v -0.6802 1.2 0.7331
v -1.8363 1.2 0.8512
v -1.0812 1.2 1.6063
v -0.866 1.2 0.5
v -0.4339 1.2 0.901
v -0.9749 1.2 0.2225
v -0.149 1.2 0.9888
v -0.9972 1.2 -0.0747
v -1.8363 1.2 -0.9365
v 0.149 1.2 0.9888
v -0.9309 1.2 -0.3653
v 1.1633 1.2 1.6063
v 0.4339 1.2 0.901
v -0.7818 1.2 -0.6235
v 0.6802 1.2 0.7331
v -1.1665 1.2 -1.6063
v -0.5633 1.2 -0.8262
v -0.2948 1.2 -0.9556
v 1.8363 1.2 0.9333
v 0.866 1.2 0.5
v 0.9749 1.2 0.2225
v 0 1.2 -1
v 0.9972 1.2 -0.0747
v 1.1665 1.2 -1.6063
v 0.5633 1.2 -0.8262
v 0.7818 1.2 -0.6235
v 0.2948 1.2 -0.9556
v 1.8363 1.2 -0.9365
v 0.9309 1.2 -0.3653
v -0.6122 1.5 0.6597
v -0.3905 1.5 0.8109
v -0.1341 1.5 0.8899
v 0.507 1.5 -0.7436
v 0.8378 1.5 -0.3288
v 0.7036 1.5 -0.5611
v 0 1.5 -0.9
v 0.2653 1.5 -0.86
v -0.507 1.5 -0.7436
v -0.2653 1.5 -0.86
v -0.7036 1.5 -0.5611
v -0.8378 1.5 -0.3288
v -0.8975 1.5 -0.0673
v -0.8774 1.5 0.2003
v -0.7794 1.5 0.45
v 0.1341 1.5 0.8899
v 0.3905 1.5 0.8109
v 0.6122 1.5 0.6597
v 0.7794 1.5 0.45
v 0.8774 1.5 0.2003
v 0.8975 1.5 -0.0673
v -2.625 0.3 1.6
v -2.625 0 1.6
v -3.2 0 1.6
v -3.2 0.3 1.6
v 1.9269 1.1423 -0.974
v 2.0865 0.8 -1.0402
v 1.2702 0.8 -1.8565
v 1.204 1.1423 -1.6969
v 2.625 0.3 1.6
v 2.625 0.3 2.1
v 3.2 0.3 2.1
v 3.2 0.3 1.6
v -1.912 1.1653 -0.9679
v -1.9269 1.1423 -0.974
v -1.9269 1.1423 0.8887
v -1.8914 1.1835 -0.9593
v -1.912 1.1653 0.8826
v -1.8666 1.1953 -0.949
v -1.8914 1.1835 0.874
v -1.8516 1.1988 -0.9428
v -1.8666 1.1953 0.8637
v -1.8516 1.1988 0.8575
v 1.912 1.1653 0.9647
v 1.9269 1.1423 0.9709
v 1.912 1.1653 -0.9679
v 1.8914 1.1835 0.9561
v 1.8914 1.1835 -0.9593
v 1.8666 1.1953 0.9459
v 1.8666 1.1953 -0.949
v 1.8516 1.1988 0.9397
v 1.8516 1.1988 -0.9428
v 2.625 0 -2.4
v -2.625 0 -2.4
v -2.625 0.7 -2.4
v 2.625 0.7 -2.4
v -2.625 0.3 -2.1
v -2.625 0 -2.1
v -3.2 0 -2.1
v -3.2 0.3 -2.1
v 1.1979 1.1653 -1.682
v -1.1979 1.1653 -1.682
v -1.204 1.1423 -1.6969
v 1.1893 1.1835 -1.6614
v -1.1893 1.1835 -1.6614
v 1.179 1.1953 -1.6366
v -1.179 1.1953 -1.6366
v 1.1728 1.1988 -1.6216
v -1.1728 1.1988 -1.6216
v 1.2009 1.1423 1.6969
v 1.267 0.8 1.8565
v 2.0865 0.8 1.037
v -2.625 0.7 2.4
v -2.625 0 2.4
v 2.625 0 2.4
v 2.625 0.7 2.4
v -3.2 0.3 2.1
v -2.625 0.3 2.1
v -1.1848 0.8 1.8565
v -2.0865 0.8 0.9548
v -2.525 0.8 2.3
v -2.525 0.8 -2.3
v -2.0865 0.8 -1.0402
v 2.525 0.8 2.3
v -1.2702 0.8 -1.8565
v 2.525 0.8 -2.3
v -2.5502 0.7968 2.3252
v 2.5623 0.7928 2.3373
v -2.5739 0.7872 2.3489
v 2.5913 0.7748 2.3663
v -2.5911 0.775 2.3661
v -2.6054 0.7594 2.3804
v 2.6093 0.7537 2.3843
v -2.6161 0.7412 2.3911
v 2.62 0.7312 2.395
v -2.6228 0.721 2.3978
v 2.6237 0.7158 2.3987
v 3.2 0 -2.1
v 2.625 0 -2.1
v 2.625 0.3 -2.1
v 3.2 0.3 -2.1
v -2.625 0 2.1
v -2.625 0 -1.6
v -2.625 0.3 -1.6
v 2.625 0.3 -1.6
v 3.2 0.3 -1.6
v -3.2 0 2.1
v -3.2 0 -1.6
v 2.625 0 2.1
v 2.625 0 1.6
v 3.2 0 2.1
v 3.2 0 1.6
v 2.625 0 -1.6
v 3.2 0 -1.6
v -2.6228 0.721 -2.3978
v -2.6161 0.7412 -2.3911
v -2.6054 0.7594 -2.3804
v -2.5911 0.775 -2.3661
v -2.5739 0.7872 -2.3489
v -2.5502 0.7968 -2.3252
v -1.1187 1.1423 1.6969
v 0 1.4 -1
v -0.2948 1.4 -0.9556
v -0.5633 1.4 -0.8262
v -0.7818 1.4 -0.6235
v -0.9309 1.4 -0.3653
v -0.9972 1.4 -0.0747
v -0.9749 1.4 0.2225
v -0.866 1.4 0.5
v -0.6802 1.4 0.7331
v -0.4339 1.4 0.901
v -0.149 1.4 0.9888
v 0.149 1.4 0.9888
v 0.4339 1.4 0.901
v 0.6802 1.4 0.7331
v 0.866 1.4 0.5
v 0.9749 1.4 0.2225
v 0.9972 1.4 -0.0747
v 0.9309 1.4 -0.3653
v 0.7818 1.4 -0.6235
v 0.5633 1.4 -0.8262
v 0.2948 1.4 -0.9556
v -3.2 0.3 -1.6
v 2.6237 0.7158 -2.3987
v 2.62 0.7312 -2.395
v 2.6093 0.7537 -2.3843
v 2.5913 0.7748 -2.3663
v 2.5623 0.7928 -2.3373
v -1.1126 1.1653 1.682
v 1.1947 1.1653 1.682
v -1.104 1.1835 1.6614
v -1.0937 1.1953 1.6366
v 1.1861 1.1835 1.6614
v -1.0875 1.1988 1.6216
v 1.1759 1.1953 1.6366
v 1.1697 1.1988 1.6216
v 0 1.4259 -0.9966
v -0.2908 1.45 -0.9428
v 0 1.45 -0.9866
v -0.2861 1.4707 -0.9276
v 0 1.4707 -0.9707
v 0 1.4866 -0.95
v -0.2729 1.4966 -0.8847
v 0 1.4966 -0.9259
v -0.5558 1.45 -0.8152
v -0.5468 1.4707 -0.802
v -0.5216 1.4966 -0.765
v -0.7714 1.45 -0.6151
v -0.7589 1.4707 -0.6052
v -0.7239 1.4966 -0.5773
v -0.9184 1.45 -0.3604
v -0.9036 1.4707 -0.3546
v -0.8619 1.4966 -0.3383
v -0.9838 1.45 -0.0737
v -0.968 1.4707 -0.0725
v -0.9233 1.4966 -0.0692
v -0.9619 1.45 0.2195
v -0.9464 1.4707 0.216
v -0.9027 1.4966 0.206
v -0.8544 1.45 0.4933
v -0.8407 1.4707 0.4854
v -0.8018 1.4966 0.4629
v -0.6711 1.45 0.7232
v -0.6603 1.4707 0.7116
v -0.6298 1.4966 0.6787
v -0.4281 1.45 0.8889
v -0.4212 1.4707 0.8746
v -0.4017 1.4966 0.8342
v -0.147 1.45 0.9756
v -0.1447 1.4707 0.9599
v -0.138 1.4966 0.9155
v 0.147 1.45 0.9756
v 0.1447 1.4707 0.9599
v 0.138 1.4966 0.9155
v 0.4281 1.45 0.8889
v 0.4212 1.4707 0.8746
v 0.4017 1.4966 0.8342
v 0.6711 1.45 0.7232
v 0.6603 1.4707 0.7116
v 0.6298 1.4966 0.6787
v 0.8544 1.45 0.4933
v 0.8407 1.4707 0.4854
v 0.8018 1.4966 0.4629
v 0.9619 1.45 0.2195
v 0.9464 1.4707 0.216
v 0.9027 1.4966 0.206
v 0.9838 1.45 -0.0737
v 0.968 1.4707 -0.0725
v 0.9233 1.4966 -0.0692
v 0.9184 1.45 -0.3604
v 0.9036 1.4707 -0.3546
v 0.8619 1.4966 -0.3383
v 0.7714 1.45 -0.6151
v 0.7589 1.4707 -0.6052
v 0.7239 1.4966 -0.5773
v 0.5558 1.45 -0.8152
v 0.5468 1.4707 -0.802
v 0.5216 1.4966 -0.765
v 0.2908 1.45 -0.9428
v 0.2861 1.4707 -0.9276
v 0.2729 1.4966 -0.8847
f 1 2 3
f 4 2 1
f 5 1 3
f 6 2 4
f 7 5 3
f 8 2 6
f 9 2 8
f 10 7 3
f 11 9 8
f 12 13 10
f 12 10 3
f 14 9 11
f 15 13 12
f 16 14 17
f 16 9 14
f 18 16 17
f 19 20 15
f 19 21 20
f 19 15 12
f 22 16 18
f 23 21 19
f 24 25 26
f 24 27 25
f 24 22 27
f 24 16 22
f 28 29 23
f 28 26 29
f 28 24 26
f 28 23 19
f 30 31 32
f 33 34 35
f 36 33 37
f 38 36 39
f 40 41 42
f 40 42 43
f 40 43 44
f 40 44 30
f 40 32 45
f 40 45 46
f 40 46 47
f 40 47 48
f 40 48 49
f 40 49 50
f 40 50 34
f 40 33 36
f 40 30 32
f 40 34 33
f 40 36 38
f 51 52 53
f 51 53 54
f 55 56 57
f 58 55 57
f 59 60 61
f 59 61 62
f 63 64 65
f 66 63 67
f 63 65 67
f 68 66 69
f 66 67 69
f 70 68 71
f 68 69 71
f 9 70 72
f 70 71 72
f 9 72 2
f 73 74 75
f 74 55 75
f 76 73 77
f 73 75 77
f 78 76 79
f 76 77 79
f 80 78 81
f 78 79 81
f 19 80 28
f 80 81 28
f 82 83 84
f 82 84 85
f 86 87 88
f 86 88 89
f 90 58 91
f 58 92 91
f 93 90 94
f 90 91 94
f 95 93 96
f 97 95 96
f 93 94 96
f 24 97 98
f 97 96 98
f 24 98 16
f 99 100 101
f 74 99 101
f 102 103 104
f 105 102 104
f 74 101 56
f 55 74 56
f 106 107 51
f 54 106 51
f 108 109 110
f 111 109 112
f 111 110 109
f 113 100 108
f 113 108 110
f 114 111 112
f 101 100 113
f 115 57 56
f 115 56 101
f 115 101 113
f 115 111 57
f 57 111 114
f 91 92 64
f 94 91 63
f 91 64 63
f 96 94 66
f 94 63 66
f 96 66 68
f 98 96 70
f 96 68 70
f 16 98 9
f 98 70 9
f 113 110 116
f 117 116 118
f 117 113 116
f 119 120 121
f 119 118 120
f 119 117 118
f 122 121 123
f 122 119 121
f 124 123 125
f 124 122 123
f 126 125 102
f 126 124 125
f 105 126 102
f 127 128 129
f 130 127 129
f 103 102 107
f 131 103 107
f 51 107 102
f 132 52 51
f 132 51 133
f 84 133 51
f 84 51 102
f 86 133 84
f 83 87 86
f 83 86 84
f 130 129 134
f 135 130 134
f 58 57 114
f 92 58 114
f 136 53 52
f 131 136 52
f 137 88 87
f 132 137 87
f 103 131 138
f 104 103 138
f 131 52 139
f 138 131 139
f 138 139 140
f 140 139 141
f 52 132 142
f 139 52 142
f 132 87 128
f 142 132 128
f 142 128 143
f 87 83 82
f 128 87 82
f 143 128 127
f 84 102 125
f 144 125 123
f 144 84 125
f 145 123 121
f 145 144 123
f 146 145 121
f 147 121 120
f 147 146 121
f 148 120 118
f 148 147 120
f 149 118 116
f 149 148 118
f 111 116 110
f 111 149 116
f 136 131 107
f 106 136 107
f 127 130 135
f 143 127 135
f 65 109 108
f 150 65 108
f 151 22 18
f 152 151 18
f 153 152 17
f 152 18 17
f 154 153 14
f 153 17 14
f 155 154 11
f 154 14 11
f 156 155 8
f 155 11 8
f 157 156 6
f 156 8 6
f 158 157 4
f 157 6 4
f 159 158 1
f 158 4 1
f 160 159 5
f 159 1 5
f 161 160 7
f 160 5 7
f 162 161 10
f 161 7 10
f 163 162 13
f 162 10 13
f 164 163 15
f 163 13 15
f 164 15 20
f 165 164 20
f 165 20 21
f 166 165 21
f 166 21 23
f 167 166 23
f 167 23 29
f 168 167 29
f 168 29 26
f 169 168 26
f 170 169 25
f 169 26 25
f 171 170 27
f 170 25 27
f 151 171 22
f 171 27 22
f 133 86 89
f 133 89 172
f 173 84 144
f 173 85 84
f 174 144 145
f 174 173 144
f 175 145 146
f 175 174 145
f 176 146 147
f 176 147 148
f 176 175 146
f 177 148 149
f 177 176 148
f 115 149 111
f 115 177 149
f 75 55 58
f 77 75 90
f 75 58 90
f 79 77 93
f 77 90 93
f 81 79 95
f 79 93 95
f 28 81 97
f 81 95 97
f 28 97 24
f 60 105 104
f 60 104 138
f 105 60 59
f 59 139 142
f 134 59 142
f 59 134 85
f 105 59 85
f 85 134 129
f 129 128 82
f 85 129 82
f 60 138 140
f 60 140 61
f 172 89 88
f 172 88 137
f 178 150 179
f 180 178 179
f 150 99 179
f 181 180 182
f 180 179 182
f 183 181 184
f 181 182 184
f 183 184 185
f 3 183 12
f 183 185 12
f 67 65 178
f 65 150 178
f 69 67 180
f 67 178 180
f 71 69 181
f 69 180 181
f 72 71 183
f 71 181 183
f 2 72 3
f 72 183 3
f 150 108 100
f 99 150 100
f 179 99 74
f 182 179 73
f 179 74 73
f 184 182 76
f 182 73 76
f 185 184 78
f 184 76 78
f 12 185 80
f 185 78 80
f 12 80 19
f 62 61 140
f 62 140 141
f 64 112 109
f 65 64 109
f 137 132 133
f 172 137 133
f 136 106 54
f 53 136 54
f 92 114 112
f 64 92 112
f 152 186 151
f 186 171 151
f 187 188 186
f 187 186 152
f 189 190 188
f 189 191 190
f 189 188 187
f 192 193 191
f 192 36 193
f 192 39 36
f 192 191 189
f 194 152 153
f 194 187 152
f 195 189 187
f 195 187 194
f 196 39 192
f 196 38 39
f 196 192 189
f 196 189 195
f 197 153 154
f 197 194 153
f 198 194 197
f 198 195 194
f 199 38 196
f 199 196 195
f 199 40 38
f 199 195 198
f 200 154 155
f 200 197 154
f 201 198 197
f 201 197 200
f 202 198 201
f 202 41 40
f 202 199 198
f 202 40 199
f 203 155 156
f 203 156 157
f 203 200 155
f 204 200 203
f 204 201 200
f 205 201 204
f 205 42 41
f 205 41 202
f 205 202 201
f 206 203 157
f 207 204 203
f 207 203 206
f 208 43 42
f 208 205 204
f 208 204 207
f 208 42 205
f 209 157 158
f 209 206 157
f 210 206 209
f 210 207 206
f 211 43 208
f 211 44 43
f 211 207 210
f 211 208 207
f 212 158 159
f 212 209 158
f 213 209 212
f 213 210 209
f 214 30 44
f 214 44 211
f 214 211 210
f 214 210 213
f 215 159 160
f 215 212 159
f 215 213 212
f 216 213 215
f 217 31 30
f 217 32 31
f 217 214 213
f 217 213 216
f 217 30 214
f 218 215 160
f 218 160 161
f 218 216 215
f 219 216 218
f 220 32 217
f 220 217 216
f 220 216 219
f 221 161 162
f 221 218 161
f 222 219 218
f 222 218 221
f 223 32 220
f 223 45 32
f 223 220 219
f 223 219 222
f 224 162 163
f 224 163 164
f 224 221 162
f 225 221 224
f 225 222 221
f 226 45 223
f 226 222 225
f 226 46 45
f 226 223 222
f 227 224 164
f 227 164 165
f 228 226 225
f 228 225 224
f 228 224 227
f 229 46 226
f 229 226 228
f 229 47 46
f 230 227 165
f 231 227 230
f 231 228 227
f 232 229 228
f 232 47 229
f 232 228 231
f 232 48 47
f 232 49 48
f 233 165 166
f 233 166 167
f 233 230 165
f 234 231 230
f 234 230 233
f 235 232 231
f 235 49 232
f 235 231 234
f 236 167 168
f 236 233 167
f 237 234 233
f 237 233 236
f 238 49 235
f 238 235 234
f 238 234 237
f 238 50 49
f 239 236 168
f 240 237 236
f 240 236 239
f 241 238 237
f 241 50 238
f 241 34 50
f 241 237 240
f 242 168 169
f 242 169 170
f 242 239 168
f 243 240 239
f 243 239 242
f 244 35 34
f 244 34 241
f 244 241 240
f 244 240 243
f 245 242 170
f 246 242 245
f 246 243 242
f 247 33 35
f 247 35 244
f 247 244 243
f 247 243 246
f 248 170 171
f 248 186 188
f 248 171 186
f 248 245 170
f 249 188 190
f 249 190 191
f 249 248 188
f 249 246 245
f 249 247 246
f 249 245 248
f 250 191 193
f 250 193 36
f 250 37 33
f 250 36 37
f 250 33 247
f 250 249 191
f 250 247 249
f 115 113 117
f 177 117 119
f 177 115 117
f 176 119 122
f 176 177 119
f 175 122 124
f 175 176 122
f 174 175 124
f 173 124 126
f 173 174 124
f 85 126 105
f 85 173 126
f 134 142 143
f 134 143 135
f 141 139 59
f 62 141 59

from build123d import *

# Parameters (mm, degrees)
SKETCH1_W               = 5.25
SKETCH1_H               = 4.8
BOSS_EXTRUDE1_DEPTH     = 0.8
BOSS_EXTRUDE2_DEPTH     = 0.4
SKETCH3_R               = 1
BOSS_EXTRUDE3_DEPTH     = 0.3
SKETCH4_W               = 0.5
SKETCH4_H               = 0.3
BOSS_EXTRUDE4_DEPTH     = 0.575
MIRROR2_COPY_1_SKETCH_W = 0.5
MIRROR2_COPY_1_SKETCH_H = 0.3
MIRROR2_COPY_1_DEPTH    = 0.575
DRAFT3_ANGLE            = 25
FILLET1_R               = 0.1
FILLET2_R               = 0.1


with BuildPart() as part:
    # Sketch1 → Boss-Extrude1 (new body)
    with BuildSketch(Plane(origin=(0, 0, 0), x_dir=(1, 0, 0), z_dir=(0, 1, 0))):
        Rectangle(SKETCH1_W, SKETCH1_H)
    extrude(amount=BOSS_EXTRUDE1_DEPTH)

    # Sketch2 → Boss-Extrude2 (add)
    with BuildSketch(Plane(origin=(0, 0.8, 0), x_dir=(1, 0, 0), z_dir=(0, 1, 0))):
        Polygon((-1.107585867, -1.67), (1.189705704, -1.67), (1.9, -0.959705704), (1.9, 0.962893219), (1.192893219, 1.67), (-1.192893219, 1.67), (-1.9, 0.962893219), (-1.9, -0.877585867), align=None)
    extrude(amount=BOSS_EXTRUDE2_DEPTH)

    # Sketch3 → Boss-Extrude3 (add)
    with BuildSketch(Plane(origin=(0, 1.2, 0), x_dir=(1, 0, 0), z_dir=(0, 1, 0))):
        with Locations(Location((0, 0, 0), (0, 0, 90))):
            Circle(SKETCH3_R)
    extrude(amount=BOSS_EXTRUDE3_DEPTH)

    # Sketch4 → Boss-Extrude4 (add)
    with BuildSketch(Plane(origin=(2.625, 0, 0), x_dir=(0, 0, -1), z_dir=(1, 0, 0))):
        with Locations((-1.85, 0.15)):
            Rectangle(SKETCH4_W, SKETCH4_H)
    boss_extrude4 = extrude(amount=BOSS_EXTRUDE4_DEPTH)

    # Mirror1: Boss-Extrude4 across plane
    add(boss_extrude4.mirror(Plane.XY))

    # Mirror2: Boss-Extrude4 across plane
    add(boss_extrude4.mirror(Plane(origin=(0, 0, 0), x_dir=(0, 0, 1), z_dir=(1, 0, 0))))

    # Mirror2 copy 1 sketch → Mirror2 copy 1 (add)
    with BuildSketch(Plane.ZY.offset(2.625)):
        with Locations((-1.85, 0.15)):
            Rectangle(MIRROR2_COPY_1_SKETCH_W, MIRROR2_COPY_1_SKETCH_H)
    extrude(amount=MIRROR2_COPY_1_DEPTH)

    # Draft3
    draft3_faces = [part.faces().sort_by_distance(p)[0] for p in [
        (1.544852852, 1, 1.314852852),
        (0.041059918, 1, 1.67),
        (-1.503792933, 1, 1.273792933),
        (-1.9, 1, -0.042653676),
        (-1.546446609, 1, -1.316446609),
        (0, 1, -1.67),
        (1.546446609, 1, -1.316446609),
        (1.9, 1, -0.001593757),
    ]]
    draft(draft3_faces, Plane(origin=(2.861299461, 1.2, -0.001593757), x_dir=(0, 0, 1), z_dir=(0, 1, 0)), DRAFT3_ANGLE)

    # Fillet1
    fillet1_edges = [part.edges().sort_by_distance(p)[0] for p in [
        (2.625, 0.8, 0),
        (0, 0.8, -2.4),
        (1.544852852, 1.2, 1.314852852),
        (1.9, 1.2, -0.001593757),
        (1.546446609, 1.2, -1.316446609),
        (0, 1.2, -1.67),
        (-1.546446609, 1.2, -1.316446609),
        (-1.9, 1.2, -0.042653676),
        (-1.503792933, 1.2, 1.273792933),
        (0.041059918, 1.2, 1.67),
        (-2.625, 0.8, 0),
        (0, 0.8, 2.4),
    ]]
    fillet(fillet1_edges, radius=FILLET1_R)

    # Fillet2
    fillet2_edges = [part.edges().sort_by_distance(p)[0] for p in [
        (0, 1.5, 1),
    ]]
    fillet(fillet2_edges, radius=FILLET2_R)


solid = part.part
